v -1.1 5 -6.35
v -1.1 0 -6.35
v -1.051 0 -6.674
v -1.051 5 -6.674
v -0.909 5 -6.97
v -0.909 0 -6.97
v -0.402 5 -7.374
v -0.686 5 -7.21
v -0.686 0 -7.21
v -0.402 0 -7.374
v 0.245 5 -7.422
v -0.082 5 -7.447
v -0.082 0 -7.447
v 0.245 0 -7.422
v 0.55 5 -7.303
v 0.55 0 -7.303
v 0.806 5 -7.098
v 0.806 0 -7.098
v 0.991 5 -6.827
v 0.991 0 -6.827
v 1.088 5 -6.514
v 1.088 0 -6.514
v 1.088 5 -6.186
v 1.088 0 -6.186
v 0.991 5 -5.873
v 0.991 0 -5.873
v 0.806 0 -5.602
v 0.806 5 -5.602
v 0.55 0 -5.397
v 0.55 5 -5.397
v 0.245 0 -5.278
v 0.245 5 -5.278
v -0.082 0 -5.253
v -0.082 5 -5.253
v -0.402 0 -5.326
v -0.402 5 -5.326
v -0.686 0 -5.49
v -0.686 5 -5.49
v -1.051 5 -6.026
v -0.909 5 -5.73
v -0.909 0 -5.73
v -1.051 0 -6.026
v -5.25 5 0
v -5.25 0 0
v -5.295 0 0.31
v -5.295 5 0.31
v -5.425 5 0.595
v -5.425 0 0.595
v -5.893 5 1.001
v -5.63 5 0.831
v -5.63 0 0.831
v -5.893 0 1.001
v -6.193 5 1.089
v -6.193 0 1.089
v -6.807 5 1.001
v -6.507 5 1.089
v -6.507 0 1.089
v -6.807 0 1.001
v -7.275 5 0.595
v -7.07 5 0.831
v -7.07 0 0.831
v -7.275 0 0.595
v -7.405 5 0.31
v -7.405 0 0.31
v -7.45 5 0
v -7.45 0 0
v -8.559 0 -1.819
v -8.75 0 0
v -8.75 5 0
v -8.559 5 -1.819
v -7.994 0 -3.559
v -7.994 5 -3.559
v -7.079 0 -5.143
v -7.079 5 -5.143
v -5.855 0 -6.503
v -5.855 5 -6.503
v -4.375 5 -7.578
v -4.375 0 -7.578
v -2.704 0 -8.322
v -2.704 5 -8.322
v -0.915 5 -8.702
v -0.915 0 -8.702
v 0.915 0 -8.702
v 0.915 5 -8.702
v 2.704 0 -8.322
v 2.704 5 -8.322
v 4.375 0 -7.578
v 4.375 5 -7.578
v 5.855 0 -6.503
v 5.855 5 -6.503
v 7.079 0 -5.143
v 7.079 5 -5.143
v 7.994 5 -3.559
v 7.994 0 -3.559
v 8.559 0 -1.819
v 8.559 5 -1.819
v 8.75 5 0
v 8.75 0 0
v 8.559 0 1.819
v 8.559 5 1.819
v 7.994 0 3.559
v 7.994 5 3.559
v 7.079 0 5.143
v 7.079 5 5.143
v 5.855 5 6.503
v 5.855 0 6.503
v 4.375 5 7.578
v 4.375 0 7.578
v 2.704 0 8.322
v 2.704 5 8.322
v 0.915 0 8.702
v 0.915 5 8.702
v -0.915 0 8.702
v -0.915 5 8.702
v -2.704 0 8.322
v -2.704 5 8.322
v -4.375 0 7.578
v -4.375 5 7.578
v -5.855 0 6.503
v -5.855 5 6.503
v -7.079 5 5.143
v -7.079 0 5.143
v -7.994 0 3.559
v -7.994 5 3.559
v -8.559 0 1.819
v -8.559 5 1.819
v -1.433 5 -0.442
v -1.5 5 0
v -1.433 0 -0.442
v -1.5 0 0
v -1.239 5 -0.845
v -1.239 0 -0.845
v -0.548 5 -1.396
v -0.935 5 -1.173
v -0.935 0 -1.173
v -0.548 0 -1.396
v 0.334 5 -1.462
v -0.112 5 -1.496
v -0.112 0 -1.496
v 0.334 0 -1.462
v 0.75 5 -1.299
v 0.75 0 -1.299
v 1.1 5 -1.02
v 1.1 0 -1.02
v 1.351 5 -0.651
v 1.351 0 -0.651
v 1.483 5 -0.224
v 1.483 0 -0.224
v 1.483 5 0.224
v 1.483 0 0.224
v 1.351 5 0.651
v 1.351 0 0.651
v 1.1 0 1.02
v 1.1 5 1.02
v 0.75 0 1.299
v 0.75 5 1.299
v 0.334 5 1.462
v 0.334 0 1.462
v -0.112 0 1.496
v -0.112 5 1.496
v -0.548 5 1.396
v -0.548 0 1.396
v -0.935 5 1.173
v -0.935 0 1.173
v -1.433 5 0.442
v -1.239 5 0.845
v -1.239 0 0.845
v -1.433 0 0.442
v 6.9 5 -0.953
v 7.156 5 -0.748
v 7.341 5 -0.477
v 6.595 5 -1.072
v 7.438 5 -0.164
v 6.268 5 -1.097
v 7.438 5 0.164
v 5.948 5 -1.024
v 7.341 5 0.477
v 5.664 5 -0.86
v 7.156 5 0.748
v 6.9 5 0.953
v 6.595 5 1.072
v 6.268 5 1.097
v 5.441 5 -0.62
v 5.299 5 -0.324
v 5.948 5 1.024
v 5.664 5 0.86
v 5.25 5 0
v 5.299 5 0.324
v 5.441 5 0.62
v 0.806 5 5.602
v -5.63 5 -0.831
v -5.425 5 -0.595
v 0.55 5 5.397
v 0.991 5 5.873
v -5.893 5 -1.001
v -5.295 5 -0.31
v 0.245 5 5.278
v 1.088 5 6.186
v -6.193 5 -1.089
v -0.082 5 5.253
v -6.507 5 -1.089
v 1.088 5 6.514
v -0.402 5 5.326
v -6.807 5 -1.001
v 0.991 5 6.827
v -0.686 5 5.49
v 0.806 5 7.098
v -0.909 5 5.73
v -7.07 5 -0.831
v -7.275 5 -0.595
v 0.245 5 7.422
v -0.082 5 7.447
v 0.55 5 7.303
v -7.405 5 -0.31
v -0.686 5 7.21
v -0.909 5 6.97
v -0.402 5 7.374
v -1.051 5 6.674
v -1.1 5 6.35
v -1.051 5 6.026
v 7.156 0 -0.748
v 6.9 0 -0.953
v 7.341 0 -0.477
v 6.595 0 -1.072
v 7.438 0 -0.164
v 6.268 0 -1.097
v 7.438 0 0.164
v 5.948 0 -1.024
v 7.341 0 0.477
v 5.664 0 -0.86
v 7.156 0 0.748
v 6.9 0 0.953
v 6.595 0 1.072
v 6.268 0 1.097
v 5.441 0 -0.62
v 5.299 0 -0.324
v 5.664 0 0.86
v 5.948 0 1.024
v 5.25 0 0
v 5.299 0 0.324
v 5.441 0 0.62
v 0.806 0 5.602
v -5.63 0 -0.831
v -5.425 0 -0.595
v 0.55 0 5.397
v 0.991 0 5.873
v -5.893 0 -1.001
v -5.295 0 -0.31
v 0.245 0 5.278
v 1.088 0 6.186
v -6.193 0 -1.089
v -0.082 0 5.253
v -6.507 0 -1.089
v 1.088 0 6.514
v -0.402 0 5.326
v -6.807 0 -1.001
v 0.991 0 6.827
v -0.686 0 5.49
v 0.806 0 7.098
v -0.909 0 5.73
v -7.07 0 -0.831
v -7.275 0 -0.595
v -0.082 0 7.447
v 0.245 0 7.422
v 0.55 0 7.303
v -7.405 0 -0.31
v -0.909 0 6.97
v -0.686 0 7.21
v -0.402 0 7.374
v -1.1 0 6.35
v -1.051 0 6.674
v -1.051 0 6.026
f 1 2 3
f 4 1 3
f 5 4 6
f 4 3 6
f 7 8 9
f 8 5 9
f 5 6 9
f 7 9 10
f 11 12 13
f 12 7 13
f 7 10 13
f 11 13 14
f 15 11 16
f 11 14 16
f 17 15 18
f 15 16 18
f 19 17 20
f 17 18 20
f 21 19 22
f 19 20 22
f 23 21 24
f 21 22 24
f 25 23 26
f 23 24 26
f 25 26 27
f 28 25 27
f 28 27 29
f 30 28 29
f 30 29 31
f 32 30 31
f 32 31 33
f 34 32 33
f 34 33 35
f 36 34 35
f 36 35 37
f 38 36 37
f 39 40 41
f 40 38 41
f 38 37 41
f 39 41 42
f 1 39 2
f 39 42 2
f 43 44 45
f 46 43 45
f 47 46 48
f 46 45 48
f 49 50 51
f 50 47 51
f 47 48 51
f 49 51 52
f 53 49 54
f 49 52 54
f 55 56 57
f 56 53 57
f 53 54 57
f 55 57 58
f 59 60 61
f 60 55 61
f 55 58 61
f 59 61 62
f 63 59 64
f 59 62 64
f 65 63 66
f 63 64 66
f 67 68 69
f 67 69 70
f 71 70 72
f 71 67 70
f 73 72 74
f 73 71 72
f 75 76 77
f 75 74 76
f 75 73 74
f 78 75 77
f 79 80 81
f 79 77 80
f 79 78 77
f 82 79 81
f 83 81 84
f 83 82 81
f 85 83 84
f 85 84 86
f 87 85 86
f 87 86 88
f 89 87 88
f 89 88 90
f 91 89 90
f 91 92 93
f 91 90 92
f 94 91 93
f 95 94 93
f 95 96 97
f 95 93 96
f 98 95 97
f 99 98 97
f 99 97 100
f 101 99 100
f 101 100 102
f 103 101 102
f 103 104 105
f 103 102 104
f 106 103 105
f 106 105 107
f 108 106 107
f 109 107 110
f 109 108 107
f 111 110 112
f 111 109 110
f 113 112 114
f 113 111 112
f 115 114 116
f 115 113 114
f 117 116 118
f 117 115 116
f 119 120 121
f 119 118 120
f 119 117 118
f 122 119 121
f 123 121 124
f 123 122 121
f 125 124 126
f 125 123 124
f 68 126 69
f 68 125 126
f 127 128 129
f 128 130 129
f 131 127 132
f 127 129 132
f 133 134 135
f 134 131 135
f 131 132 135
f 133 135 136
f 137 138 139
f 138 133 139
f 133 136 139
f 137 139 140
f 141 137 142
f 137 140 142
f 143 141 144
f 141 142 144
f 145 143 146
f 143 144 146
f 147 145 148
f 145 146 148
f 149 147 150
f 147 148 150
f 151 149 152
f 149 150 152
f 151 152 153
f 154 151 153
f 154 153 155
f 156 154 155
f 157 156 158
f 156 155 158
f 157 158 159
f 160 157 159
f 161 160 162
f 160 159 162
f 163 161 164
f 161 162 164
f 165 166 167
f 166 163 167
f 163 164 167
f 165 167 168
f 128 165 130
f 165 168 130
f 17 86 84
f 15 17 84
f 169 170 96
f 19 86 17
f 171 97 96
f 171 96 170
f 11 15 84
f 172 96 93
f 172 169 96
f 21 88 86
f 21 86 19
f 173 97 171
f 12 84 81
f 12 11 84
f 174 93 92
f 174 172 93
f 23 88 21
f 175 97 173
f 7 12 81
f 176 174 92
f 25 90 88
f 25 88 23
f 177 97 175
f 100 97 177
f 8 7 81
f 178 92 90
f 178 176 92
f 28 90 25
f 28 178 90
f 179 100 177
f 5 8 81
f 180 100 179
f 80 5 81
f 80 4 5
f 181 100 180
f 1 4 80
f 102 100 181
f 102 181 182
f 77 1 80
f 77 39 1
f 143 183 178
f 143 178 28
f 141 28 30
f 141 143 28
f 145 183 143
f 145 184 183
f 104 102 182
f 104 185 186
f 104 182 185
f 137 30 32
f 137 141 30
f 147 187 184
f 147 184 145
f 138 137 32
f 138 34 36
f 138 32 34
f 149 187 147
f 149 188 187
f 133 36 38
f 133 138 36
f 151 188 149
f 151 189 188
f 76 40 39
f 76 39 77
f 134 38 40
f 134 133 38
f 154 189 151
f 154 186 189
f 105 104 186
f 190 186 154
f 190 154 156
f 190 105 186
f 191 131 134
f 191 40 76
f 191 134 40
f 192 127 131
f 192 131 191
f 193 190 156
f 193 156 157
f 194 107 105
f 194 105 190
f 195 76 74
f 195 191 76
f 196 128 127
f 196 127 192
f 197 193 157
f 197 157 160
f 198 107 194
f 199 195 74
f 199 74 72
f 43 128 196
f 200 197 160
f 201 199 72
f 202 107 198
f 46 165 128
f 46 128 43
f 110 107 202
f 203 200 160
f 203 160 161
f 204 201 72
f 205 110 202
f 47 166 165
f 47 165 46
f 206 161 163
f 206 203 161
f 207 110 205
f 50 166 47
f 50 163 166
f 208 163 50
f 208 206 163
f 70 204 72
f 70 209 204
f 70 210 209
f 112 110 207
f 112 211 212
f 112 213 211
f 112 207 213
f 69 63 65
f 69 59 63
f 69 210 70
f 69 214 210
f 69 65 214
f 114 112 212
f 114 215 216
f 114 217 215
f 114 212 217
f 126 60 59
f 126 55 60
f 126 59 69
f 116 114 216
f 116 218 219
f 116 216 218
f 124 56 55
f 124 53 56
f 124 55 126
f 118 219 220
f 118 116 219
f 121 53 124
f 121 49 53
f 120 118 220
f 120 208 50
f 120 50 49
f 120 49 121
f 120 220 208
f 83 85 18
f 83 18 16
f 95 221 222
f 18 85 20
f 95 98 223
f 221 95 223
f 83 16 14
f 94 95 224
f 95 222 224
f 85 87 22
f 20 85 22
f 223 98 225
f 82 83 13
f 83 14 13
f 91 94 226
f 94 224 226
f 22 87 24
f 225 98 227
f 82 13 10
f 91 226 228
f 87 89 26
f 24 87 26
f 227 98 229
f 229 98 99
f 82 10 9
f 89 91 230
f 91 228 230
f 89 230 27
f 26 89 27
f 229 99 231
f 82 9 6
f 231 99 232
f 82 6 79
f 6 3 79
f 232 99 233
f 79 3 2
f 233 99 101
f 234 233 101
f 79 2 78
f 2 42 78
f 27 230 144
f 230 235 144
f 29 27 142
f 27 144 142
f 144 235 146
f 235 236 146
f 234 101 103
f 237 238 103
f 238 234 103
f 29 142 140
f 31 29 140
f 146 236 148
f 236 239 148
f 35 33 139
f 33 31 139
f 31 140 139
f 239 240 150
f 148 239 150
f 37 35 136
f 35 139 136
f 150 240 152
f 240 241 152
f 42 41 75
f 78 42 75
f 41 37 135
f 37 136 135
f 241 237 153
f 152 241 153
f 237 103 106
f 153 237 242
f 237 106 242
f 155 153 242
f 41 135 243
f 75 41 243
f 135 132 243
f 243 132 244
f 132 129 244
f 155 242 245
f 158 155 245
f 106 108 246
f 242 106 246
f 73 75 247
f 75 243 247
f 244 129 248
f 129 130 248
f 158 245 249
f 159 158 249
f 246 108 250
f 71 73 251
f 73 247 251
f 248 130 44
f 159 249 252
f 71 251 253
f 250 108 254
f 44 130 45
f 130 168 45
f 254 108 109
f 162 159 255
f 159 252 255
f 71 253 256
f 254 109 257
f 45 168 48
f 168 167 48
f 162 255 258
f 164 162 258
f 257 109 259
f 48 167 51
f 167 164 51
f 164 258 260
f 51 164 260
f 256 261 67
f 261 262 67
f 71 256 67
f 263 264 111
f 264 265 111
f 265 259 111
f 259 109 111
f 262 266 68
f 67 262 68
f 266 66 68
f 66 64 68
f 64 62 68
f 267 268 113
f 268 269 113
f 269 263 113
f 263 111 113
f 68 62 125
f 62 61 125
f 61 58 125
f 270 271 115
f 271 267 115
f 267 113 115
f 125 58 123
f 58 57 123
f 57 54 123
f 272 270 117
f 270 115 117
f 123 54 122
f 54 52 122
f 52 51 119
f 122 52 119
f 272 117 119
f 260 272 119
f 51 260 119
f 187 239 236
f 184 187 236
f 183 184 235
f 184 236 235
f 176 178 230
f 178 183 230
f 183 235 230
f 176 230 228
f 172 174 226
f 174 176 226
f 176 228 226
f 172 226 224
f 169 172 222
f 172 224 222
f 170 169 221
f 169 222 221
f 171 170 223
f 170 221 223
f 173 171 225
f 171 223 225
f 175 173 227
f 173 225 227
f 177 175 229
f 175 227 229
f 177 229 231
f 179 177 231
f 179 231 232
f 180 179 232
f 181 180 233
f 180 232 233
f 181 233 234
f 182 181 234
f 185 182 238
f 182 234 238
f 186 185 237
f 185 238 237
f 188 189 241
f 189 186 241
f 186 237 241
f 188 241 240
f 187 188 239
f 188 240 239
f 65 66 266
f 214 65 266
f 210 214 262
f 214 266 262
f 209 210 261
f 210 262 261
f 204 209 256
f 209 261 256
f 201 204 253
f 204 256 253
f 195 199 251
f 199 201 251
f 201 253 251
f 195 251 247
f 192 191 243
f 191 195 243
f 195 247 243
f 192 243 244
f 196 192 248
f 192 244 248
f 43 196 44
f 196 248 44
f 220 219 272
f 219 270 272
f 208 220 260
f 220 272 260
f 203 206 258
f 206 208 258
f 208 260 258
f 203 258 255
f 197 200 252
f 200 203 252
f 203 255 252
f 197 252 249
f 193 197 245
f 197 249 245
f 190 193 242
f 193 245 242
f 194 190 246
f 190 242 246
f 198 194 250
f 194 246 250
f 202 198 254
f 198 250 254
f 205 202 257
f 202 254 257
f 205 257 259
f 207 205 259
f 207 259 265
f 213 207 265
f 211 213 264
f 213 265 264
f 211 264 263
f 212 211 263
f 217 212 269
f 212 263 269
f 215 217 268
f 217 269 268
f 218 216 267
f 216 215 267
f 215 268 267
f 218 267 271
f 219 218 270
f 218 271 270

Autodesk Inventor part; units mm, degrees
ref_plane "YZ Plane" through (0, 0, 0) normal (1, 0, 0) x (0, 1, 0)
ref_plane "XZ Plane" through (0, 0, 0) normal (0, 1, 0) x (-1, 0, 0)
ref_plane "XY Plane" through (0, 0, 0) normal (0, 0, 1) x (1, 0, 0)
sketch "Sketch1" plane through (0, 0, 0) normal (0, 1, 0) x (-1, 0, 0)
  circle A0 centre (0, 0) radius 8.75
  circle A1 centre (0, 0) radius 1.5
  line L0 (0, 0) -> (6.35, 0)
  circle A2 centre (6.35, 0) radius 1.1
  circle A3 centre (0, 6.35) radius 1.1
  circle A4 centre (-6.35, 0) radius 1.1
  circle A5 centre (0, -6.35) radius 1.1
  dimension "d0" = 17.5
  dimension "d1" = 3
  dimension "d2" = 6.35
  dimension "d3" = 2.2
  dimension "d6" = 360
extrude "Extrusion1" add sketch "Sketch1" along normal blind 5
properties part number "Hub"
